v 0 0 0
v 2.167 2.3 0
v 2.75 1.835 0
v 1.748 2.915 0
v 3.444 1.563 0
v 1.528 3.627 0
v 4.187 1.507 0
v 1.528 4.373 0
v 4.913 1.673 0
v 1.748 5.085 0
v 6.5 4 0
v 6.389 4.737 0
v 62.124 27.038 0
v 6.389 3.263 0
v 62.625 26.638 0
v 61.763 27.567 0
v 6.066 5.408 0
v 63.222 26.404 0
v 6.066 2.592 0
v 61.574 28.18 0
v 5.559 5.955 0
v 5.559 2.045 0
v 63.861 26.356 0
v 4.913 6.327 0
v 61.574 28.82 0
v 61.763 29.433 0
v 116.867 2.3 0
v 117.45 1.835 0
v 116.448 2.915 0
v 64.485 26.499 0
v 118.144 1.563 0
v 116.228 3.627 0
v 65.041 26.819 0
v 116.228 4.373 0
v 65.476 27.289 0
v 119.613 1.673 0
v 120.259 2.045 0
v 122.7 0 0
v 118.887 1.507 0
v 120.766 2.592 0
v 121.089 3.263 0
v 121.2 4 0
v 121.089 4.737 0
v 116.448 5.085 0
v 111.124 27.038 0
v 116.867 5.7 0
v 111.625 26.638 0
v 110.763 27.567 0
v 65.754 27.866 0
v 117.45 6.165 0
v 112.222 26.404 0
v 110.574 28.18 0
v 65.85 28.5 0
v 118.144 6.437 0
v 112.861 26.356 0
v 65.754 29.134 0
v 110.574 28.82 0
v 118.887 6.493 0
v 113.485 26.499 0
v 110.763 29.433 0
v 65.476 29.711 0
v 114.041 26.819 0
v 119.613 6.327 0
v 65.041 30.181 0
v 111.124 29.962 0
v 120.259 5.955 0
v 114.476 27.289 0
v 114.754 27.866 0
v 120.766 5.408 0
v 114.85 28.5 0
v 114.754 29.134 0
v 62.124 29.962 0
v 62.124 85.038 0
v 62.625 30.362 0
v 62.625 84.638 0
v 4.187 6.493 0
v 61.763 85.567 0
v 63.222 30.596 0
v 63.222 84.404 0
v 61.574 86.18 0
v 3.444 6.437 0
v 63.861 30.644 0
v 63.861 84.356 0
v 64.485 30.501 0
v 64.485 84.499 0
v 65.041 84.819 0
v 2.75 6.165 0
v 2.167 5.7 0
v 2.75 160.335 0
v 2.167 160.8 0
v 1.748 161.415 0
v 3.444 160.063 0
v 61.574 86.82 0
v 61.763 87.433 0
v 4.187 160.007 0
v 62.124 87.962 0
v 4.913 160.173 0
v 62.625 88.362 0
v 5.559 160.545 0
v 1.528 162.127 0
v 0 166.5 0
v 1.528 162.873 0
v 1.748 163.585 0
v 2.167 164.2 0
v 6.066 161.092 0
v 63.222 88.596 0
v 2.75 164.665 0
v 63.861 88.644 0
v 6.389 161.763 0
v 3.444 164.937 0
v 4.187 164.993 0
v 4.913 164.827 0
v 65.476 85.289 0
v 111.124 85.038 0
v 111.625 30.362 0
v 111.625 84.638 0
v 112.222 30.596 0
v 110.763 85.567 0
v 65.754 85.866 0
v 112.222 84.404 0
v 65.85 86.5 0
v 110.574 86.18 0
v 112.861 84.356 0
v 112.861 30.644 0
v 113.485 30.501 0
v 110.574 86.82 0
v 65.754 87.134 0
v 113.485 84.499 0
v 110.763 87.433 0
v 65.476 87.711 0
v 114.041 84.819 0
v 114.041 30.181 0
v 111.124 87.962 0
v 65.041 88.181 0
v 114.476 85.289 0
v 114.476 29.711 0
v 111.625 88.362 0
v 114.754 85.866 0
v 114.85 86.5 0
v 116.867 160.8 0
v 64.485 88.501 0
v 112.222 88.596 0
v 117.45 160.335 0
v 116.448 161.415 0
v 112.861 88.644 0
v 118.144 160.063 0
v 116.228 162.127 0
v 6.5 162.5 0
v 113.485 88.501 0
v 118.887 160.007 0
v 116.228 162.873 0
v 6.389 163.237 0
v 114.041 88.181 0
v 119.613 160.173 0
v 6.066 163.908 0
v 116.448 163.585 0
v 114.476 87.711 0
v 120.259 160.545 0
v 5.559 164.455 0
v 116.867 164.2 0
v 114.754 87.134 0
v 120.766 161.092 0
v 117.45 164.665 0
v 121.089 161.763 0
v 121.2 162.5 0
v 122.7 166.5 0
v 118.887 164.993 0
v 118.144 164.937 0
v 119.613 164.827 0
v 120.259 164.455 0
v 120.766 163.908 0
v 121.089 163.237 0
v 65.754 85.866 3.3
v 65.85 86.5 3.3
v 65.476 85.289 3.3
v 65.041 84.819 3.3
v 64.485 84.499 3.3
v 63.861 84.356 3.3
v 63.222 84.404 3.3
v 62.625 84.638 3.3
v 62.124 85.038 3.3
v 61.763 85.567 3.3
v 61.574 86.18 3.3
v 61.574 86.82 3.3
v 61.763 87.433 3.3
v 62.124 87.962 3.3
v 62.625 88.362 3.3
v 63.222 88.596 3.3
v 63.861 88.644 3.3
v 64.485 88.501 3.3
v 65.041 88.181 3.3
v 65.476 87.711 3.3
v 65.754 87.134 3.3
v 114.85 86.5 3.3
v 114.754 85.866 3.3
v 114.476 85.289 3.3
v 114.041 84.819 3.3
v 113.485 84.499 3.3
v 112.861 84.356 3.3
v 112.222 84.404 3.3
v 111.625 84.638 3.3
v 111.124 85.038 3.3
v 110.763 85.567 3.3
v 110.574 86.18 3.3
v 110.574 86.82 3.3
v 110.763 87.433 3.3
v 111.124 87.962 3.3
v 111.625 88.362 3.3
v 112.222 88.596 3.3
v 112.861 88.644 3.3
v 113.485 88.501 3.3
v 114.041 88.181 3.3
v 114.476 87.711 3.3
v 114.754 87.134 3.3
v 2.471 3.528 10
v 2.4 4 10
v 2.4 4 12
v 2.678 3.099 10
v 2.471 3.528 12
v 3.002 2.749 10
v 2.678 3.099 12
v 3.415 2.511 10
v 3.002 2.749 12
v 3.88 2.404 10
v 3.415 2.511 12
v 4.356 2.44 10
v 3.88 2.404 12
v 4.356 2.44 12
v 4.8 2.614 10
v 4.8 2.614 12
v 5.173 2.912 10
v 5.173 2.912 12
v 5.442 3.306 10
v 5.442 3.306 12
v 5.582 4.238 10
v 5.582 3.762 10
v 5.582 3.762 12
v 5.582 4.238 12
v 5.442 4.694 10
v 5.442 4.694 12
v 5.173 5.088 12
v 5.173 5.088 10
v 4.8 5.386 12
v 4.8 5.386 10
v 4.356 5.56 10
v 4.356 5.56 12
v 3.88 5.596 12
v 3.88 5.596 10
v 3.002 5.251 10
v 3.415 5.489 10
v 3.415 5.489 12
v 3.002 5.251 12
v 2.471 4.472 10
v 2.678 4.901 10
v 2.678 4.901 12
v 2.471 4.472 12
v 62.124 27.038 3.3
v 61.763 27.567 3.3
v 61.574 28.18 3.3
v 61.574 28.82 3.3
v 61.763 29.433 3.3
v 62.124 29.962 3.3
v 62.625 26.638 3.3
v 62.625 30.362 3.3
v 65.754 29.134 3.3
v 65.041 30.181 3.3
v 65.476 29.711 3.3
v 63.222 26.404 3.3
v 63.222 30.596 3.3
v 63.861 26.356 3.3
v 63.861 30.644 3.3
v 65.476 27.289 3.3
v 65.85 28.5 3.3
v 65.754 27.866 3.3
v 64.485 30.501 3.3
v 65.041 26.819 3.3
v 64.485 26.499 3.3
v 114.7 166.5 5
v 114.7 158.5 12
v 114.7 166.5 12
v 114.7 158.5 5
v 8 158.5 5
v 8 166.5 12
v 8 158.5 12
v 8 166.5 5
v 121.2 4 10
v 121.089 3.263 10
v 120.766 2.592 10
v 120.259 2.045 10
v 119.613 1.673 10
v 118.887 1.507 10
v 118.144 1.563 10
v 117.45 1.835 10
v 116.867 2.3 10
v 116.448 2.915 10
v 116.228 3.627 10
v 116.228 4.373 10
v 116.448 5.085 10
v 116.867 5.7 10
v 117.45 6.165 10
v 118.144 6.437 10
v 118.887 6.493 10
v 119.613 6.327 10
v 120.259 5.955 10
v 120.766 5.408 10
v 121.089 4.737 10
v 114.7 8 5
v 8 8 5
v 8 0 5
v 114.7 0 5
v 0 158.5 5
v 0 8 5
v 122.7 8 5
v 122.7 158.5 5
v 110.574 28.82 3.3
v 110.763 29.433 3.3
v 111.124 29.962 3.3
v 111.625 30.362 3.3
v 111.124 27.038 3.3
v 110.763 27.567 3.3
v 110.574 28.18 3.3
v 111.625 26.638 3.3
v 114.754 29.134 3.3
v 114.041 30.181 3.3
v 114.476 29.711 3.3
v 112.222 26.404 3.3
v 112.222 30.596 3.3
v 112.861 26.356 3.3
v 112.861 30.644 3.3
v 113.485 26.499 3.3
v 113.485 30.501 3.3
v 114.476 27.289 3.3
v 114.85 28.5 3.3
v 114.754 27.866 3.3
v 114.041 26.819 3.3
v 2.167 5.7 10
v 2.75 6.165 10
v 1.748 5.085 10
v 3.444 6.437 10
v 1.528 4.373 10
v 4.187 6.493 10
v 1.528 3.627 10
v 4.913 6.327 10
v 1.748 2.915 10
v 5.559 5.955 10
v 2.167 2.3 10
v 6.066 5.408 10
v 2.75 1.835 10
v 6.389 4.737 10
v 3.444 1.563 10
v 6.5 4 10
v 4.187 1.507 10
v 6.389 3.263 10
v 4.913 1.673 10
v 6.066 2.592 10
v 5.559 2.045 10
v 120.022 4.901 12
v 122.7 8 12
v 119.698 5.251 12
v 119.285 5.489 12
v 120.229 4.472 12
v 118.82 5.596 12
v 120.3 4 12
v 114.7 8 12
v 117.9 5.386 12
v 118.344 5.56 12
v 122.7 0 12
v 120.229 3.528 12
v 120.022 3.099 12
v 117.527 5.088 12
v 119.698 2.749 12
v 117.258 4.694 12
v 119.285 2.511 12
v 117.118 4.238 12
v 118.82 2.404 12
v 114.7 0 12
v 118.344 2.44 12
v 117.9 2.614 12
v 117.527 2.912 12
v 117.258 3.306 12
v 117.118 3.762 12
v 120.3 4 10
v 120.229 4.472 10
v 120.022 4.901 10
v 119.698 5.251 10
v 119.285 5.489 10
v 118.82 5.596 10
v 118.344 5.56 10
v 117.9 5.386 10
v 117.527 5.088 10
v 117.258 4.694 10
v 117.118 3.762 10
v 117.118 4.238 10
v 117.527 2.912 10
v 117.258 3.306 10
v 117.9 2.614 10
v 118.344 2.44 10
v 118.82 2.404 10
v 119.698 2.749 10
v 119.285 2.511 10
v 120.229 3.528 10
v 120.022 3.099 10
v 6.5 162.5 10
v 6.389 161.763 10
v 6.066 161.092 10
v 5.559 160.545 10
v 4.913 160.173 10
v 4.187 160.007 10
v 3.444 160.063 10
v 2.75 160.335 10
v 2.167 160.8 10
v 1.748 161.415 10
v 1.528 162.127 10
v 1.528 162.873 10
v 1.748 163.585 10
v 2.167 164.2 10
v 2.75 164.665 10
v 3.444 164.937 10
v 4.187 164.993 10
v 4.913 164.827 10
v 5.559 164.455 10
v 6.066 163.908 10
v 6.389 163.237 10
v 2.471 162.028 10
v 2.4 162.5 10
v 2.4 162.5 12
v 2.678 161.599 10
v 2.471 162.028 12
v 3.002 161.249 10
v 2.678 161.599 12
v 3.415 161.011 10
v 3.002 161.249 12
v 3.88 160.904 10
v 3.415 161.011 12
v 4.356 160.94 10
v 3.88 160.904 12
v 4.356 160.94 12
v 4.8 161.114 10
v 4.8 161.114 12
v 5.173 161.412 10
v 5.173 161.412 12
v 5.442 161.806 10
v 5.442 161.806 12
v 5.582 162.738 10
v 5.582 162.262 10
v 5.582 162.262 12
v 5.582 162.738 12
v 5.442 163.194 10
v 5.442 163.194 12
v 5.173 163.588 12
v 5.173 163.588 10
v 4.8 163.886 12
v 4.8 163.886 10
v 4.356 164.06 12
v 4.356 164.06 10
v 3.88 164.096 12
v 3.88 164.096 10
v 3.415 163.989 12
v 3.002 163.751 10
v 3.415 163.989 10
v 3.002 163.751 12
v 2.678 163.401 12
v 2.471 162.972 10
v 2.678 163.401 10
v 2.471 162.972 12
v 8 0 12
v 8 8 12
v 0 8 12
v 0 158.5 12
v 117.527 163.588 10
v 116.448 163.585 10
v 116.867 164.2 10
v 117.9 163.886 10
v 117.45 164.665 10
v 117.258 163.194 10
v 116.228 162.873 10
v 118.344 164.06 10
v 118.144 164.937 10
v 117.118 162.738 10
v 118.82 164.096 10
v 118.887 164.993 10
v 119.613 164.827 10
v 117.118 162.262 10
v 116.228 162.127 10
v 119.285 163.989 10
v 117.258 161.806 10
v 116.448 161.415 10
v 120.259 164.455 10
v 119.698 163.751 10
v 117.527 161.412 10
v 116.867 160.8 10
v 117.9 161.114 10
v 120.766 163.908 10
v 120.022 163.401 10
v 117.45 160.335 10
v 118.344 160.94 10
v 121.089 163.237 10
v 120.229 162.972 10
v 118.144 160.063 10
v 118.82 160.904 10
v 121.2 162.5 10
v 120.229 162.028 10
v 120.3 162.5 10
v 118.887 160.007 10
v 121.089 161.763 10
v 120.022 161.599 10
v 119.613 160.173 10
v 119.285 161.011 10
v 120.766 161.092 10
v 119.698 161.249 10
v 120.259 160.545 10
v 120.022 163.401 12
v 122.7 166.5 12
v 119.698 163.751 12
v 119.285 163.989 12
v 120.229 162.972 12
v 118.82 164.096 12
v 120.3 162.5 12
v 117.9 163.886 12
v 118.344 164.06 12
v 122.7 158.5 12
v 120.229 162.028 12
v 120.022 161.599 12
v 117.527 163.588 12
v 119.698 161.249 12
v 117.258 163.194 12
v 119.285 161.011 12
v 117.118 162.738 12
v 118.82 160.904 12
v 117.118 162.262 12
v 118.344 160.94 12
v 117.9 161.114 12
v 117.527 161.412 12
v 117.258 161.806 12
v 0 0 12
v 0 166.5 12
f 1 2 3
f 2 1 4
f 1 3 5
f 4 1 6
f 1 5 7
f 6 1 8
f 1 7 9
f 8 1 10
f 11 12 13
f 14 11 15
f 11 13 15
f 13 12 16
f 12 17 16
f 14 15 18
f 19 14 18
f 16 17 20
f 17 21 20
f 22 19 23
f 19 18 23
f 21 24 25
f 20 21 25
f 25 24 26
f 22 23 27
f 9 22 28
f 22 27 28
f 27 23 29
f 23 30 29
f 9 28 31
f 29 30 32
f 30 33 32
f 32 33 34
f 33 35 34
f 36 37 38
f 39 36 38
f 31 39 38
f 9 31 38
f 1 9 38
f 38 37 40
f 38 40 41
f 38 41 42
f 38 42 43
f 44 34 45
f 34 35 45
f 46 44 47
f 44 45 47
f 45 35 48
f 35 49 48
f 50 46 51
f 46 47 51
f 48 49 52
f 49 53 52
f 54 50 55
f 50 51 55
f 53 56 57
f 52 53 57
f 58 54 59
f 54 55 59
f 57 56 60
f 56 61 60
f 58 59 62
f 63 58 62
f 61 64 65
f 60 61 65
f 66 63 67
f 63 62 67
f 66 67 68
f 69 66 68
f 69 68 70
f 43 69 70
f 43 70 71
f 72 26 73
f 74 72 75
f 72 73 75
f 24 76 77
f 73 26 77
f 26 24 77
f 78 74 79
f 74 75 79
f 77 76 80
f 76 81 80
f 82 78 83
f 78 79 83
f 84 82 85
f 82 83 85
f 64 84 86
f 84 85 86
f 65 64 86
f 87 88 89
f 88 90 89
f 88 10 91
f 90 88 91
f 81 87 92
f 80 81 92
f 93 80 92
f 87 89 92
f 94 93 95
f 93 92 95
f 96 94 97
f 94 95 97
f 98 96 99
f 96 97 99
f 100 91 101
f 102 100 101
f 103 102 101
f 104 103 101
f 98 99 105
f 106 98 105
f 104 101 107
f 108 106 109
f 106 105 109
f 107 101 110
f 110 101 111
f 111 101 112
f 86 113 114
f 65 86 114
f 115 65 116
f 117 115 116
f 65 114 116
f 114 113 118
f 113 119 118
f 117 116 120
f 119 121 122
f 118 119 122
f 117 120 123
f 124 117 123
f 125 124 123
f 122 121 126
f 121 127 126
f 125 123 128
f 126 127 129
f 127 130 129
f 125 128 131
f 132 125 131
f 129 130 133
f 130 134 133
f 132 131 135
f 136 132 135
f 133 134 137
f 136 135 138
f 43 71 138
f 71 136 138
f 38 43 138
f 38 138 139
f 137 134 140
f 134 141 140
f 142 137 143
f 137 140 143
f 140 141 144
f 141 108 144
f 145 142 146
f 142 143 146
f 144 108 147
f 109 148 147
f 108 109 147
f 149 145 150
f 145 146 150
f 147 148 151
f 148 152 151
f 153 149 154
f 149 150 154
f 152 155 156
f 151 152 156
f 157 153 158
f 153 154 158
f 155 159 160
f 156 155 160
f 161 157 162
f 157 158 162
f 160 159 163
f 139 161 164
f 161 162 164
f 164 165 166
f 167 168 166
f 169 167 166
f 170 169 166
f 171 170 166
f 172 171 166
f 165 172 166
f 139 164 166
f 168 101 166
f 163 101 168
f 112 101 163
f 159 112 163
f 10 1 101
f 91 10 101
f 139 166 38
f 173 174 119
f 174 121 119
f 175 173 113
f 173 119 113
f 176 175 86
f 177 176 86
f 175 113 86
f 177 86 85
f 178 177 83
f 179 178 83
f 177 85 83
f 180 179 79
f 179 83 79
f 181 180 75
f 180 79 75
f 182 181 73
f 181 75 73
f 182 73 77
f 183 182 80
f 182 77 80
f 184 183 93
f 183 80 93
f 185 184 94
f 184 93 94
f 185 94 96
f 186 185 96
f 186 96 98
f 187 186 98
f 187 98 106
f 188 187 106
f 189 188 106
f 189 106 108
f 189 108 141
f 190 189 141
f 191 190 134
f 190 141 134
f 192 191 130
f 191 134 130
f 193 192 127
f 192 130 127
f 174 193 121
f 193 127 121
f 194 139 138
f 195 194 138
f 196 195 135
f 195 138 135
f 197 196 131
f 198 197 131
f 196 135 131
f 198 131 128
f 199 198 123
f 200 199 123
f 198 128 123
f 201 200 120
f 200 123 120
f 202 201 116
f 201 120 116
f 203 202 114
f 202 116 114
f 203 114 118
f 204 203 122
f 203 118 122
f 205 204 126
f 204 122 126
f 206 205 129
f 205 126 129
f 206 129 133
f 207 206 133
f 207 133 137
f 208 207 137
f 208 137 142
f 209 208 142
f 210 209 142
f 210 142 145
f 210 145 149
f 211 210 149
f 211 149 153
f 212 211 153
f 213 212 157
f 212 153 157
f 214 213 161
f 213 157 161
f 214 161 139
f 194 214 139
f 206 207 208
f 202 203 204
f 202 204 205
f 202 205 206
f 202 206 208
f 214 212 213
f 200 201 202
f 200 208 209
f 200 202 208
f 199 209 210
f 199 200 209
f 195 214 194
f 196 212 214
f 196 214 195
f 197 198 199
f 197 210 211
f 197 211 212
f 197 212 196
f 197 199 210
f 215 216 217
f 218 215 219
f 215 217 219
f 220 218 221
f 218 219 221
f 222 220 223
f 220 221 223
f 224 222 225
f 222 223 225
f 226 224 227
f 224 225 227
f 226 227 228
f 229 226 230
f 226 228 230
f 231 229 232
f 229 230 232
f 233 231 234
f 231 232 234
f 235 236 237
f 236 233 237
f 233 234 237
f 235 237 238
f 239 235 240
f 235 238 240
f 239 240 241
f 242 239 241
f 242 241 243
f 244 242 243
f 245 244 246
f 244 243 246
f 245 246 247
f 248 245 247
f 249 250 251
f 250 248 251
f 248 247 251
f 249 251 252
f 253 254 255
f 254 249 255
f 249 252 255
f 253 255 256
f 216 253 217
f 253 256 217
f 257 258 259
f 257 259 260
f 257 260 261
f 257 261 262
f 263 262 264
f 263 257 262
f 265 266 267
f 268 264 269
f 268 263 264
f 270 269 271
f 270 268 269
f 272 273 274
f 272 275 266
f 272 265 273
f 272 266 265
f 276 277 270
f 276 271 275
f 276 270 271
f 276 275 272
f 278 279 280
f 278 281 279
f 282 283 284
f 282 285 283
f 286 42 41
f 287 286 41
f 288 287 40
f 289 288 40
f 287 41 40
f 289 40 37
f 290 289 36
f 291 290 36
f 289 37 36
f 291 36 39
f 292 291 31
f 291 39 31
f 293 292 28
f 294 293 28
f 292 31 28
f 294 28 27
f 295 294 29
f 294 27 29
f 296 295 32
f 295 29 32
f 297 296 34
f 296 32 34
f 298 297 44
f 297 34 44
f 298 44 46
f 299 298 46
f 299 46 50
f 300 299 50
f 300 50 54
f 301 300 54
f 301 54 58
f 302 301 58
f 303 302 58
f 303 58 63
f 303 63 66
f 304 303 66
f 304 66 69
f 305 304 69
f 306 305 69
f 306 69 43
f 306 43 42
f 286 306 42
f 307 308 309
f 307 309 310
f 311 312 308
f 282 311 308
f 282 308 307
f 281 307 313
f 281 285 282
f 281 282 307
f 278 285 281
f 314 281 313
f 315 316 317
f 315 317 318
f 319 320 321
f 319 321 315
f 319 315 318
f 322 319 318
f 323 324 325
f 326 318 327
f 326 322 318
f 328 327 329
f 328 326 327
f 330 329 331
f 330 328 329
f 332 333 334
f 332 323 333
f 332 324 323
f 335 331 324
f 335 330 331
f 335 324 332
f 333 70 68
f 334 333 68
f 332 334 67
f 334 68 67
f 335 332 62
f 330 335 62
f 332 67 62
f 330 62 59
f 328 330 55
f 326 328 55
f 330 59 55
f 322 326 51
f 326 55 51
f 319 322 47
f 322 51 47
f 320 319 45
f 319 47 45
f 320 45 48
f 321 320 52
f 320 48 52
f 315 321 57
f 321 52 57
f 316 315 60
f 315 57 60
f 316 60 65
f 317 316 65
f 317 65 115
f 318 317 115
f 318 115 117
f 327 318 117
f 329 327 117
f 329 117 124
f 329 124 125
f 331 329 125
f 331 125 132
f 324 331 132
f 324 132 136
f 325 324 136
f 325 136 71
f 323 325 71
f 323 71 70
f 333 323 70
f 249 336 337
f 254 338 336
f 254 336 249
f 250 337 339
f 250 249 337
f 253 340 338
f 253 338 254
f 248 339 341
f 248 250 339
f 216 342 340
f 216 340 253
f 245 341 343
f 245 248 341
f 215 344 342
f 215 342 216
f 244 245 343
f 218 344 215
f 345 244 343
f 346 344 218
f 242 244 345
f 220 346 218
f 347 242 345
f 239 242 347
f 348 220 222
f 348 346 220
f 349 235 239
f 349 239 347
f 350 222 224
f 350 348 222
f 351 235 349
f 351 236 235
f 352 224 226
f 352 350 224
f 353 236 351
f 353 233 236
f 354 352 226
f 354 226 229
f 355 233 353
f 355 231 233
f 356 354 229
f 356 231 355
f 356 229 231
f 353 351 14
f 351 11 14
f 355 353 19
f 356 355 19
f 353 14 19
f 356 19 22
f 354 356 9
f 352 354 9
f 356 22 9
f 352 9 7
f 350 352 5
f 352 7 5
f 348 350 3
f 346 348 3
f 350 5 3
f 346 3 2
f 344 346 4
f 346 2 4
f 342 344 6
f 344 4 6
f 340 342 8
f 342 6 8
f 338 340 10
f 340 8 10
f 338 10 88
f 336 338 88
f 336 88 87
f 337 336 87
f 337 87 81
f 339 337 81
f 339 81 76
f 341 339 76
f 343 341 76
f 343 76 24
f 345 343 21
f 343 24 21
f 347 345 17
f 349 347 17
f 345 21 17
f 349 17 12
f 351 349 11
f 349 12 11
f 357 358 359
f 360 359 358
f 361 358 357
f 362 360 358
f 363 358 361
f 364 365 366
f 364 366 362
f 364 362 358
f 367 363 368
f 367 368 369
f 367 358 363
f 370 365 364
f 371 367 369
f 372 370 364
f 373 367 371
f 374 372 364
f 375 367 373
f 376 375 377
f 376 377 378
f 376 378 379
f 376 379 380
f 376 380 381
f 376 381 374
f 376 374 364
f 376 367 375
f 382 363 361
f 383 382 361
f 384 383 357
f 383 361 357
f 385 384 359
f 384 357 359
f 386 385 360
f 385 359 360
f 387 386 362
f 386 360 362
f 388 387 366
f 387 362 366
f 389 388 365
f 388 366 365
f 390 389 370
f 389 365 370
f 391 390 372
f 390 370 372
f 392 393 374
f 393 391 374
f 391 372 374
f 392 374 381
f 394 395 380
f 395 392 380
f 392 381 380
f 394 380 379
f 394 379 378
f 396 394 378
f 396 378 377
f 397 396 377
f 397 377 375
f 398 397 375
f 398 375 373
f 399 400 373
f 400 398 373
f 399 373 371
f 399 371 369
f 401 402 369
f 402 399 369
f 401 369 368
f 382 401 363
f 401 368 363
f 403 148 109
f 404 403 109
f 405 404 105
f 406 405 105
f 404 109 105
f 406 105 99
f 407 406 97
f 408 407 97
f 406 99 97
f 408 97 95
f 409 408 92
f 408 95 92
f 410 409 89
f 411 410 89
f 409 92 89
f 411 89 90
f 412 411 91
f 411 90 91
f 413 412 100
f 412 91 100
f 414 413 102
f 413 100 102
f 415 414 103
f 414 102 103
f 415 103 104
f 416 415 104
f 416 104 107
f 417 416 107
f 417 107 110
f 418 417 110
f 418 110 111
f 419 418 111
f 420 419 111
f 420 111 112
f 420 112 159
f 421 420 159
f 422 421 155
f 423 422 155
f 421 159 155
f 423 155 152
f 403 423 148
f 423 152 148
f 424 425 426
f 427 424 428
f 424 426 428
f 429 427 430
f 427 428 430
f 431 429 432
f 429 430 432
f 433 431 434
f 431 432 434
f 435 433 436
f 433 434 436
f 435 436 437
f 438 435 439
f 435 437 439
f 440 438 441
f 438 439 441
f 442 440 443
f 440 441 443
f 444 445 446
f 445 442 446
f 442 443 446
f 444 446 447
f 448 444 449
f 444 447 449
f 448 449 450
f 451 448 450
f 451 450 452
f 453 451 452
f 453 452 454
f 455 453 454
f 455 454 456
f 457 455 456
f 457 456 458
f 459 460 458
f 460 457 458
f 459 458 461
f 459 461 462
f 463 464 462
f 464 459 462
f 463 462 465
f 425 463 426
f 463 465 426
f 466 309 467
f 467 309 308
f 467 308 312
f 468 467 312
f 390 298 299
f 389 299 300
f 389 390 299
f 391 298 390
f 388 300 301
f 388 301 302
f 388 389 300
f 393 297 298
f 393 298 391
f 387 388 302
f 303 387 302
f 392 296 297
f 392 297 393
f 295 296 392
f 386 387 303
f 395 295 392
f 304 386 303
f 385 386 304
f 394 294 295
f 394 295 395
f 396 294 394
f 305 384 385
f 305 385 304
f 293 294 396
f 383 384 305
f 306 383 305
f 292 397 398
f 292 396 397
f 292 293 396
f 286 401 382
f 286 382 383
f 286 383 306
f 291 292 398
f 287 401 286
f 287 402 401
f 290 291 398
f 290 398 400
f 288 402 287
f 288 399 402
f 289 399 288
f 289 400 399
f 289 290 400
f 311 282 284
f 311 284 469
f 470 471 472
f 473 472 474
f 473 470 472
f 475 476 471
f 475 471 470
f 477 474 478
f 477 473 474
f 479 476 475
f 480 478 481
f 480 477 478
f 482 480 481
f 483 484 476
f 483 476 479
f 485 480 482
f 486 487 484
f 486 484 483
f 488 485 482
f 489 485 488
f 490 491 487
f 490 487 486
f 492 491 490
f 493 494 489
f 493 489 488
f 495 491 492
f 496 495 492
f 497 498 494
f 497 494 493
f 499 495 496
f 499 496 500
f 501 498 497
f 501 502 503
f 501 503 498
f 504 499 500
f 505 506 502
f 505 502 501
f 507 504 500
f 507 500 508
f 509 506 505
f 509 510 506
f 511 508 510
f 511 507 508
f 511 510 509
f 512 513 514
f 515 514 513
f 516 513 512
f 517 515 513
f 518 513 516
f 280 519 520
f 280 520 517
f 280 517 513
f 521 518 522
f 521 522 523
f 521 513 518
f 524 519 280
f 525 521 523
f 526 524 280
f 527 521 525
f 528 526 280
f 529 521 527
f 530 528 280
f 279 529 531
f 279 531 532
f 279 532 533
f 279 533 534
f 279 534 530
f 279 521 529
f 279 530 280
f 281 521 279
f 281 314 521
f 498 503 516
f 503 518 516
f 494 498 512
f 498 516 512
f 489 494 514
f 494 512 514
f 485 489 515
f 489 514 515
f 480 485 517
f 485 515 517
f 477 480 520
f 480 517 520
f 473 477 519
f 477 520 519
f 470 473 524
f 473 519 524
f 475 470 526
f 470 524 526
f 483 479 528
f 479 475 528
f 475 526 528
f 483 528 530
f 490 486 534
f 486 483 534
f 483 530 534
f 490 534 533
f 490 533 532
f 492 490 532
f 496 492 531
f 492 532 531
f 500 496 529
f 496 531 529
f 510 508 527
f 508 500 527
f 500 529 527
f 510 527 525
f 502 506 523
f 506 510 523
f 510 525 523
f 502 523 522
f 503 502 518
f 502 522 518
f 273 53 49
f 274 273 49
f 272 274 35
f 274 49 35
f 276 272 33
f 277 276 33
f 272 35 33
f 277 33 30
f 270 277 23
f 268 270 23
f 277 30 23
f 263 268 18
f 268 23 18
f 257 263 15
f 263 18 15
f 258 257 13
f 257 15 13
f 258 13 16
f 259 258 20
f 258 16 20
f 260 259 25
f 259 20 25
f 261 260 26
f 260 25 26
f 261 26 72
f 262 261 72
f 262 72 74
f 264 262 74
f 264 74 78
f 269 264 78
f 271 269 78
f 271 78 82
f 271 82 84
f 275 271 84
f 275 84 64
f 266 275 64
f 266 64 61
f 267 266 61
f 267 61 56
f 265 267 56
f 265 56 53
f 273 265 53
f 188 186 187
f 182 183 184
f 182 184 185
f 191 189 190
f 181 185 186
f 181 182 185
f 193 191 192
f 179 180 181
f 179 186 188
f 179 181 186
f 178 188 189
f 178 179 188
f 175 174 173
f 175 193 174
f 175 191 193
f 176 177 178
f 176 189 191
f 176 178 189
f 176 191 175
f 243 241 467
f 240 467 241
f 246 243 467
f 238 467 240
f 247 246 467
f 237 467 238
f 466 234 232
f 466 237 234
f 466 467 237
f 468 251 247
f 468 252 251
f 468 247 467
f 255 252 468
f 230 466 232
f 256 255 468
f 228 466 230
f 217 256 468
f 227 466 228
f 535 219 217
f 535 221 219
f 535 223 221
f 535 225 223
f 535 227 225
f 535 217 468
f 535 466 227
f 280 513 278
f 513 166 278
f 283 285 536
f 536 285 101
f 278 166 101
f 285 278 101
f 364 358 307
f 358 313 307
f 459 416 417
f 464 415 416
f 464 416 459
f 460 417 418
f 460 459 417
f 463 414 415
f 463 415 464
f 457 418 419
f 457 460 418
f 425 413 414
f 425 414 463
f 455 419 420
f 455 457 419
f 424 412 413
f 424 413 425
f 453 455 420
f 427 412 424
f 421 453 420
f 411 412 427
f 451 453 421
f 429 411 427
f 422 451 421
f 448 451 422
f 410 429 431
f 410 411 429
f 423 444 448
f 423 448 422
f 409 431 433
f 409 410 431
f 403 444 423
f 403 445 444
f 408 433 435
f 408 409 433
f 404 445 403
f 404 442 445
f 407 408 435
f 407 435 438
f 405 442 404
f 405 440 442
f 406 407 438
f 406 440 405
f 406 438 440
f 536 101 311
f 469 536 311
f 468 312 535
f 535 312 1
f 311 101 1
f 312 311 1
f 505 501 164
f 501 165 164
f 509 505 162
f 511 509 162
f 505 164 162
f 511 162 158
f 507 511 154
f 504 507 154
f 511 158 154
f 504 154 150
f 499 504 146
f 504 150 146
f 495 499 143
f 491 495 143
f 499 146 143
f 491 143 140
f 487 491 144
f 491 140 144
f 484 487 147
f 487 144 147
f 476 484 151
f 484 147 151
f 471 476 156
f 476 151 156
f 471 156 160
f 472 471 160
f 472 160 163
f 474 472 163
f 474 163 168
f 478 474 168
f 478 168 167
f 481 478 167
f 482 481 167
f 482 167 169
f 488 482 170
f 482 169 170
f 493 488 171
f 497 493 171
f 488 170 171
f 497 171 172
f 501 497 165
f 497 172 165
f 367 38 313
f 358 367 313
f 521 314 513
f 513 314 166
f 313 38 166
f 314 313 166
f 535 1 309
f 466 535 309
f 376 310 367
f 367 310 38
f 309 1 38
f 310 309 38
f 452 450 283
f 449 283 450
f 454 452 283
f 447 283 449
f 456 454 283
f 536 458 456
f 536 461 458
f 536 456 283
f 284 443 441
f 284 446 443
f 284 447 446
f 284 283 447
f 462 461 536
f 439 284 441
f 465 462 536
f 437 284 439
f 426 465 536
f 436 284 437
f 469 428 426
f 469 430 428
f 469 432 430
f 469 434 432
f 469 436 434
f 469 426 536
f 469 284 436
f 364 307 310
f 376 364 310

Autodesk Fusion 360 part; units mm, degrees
sketch "Sketch1" plane through (0, 0, 0) normal (0, 0, 1) x (1, 0, 0)
  line L0 (0, 0) -> (122.7, 0)
  line L1 (122.7, 0) -> (122.7, 166.5)
  line L2 (122.7, 166.5) -> (0, 166.5)
  line L3 (0, 166.5) -> (0, 0)
  dimension "d1" = 166.5
  dimension "d2" = 122.7
extrude "Extrude1" add sketch "Sketch1" along normal blind 5
sketch "Sketch2" plane through (0, 0, 5) normal (0, 0, 1) x (-1, 0, 0)
  line L0 (0, -166.5) -> (0, 0)
  line L1 (0, 0) -> (-122.7, 0)
  line L2 (-122.7, 0) -> (-122.7, -166.5)
  line L3 (-122.7, -166.5) -> (0, -166.5)
  line L4 (0, -166.5) -> (-8, -166.5)
  line L5 (-8, -166.5) -> (-8, -158.5)
  line L6 (-8, -158.5) -> (0, -158.5)
  line L7 (0, -158.5) -> (0, -166.5)
  line L8 (0, 0) -> (-8, 0)
  line L9 (-8, 0) -> (-8, -8)
  line L10 (-8, -8) -> (0, -8)
  line L11 (0, -8) -> (0, 0)
  dimension "d5" = 8
  dimension "d6" = 8
  dimension "d7" = 8
  dimension "d8" = 8
extrude "Extrude2" add sketch "Sketch2" along normal blind 7 contours L0 L3 L4 L5 L6 L7 | L0 L1 L8 L9 L10 L11
ref_plane "WorkPlane1" through (61.35, 83.25, 6) normal (-1, 0, 0) x (0, -1, 0)
mirror "Mirror1" about plane through (61.35, 83.25, 6) normal (-1, 0, 0) of "Extrude2"
sketch "Sketch3" plane through (0, 0, 12) normal (0, 0, 1) x (-1, 0, 0)
  line L0 (0, -158.5) -> (-8, -158.5)
  line L1 (-8, -158.5) -> (-8, -166.5)
  line L2 (-8, -166.5) -> (0, -166.5)
  line L3 (0, -166.5) -> (0, -158.5)
  circle A0 centre (-4, -162.5) radius 1.6
  circle A1 centre (-4, -4) radius 1.6
  line L4 (-8, -8) -> (0, -8)
  line L5 (0, -8) -> (0, 0)
  dimension "d13" = 3.2
  dimension "d14" = 4
  dimension "d15" = 4
  dimension "d16" = 3.2
  dimension "d17" = 4
  dimension "d18" = 4
extrude "Extrude3" cut sketch "Sketch3" against normal blind 13 contours A0 | A1
mirror "Mirror2" about plane through (61.35, 83.25, 6) normal (-1, 0, 0) of "Extrude3"
sketch "Sketch4" plane through (0, 0, 0) normal (0, 0, -1) x (1, 0, 0)
  circle A0 centre (118.7, -4) radius 1.6
  circle A1 centre (118.7, -162.5) radius 1.6
  circle A2 centre (4, -4) radius 1.6
  circle A3 centre (4, -162.5) radius 1.6
  line L0 (0, 0) -> (0, -166.5)
  line L1 (0, -166.5) -> (122.7, -166.5)
  line L2 (122.7, -166.5) -> (122.7, 0)
  line L3 (122.7, 0) -> (0, 0)
  circle A4 centre (63.7, -28.5) radius 2.15
  circle A5 centre (112.7, -28.5) radius 2.15
  circle A6 centre (63.7, -86.5) radius 2.15
  circle A7 centre (112.7, -86.5) radius 2.15
  line L4 (60.7, -31.5) -> (66.7, -31.5)
  line L5 (66.7, -31.5) -> (66.7, -25.5)
  line L6 (66.7, -25.5) -> (60.7, -25.5)
  line L7 (60.7, -25.5) -> (60.7, -31.5)
  line L8 (109.7, -25.5) -> (115.7, -25.5)
  line L9 (115.7, -25.5) -> (115.7, -31.5)
  line L10 (115.7, -31.5) -> (109.7, -31.5)
  line L11 (109.7, -31.5) -> (109.7, -25.5)
  line L12 (60.7, -83.5) -> (66.7, -83.5)
  line L13 (66.7, -83.5) -> (66.7, -89.5)
  line L14 (66.7, -89.5) -> (60.7, -89.5)
  line L15 (60.7, -89.5) -> (60.7, -83.5)
  line L16 (109.7, -83.5) -> (115.7, -83.5)
  line L17 (115.7, -83.5) -> (115.7, -89.5)
  line L18 (115.7, -89.5) -> (109.7, -89.5)
  line L19 (109.7, -89.5) -> (109.7, -83.5)
  dimension "d23" = 4.3
  dimension "d24" = 4.3
  dimension "d25" = 4.3
  dimension "d26" = 4.3
  dimension "d27" = 49
  dimension "d28" = 58
  dimension "d29" = 10
  dimension "d30" = 80
  dimension "d39" = 6
  dimension "d40" = 6
  dimension "d41" = 3
  dimension "d42" = 3
  dimension "d43" = 3
  dimension "d44" = 3
  dimension "d45" = 6
  dimension "d46" = 6
  dimension "d47" = 6
  dimension "d48" = 6
  dimension "d49" = 3
  dimension "d51" = 6
  dimension "d52" = 6
  dimension "d53" = 3
extrude "Extrude4" cut sketch "Sketch4" against normal blind 3.3 contours A4 | A5 | A6 | A7
sketch "Sketch5" plane through (0, 0, 0) normal (0, 0, -1) x (1, 0, 0)
  circle A0 centre (118.7, -4) radius 1.6
  circle A1 centre (118.7, -162.5) radius 1.6
  circle A2 centre (4, -4) radius 1.6
  circle A3 centre (4, -162.5) radius 1.6
  line L0 (0, 0) -> (0, -166.5)
  line L1 (0, -166.5) -> (122.7, -166.5)
  line L2 (122.7, -166.5) -> (122.7, 0)
  line L3 (122.7, 0) -> (0, 0)
  circle A4 centre (4, -4) radius 2.5
  circle A5 centre (118.7, -4) radius 2.5
  circle A6 centre (118.7, -162.5) radius 2.5
  circle A7 centre (4, -162.5) radius 2.5
  circle A8 centre (63.7, -86.5) radius 2.15
  circle A9 centre (112.7, -28.5) radius 2.15
  circle A10 centre (112.7, -86.5) radius 2.15
  circle A11 centre (63.7, -28.5) radius 2.15
  dimension "d33" = 5
  dimension "d34" = 5
  dimension "d35" = 5
  dimension "d36" = 5
extrude "Extrude5" cut sketch "Sketch5" against normal blind 10 contours A4 | A5 | A6 | A7
equation "d1 = 168.3 mm - 1.8 mm"
equation "d2 = 124 mm - 1.3 mm"
